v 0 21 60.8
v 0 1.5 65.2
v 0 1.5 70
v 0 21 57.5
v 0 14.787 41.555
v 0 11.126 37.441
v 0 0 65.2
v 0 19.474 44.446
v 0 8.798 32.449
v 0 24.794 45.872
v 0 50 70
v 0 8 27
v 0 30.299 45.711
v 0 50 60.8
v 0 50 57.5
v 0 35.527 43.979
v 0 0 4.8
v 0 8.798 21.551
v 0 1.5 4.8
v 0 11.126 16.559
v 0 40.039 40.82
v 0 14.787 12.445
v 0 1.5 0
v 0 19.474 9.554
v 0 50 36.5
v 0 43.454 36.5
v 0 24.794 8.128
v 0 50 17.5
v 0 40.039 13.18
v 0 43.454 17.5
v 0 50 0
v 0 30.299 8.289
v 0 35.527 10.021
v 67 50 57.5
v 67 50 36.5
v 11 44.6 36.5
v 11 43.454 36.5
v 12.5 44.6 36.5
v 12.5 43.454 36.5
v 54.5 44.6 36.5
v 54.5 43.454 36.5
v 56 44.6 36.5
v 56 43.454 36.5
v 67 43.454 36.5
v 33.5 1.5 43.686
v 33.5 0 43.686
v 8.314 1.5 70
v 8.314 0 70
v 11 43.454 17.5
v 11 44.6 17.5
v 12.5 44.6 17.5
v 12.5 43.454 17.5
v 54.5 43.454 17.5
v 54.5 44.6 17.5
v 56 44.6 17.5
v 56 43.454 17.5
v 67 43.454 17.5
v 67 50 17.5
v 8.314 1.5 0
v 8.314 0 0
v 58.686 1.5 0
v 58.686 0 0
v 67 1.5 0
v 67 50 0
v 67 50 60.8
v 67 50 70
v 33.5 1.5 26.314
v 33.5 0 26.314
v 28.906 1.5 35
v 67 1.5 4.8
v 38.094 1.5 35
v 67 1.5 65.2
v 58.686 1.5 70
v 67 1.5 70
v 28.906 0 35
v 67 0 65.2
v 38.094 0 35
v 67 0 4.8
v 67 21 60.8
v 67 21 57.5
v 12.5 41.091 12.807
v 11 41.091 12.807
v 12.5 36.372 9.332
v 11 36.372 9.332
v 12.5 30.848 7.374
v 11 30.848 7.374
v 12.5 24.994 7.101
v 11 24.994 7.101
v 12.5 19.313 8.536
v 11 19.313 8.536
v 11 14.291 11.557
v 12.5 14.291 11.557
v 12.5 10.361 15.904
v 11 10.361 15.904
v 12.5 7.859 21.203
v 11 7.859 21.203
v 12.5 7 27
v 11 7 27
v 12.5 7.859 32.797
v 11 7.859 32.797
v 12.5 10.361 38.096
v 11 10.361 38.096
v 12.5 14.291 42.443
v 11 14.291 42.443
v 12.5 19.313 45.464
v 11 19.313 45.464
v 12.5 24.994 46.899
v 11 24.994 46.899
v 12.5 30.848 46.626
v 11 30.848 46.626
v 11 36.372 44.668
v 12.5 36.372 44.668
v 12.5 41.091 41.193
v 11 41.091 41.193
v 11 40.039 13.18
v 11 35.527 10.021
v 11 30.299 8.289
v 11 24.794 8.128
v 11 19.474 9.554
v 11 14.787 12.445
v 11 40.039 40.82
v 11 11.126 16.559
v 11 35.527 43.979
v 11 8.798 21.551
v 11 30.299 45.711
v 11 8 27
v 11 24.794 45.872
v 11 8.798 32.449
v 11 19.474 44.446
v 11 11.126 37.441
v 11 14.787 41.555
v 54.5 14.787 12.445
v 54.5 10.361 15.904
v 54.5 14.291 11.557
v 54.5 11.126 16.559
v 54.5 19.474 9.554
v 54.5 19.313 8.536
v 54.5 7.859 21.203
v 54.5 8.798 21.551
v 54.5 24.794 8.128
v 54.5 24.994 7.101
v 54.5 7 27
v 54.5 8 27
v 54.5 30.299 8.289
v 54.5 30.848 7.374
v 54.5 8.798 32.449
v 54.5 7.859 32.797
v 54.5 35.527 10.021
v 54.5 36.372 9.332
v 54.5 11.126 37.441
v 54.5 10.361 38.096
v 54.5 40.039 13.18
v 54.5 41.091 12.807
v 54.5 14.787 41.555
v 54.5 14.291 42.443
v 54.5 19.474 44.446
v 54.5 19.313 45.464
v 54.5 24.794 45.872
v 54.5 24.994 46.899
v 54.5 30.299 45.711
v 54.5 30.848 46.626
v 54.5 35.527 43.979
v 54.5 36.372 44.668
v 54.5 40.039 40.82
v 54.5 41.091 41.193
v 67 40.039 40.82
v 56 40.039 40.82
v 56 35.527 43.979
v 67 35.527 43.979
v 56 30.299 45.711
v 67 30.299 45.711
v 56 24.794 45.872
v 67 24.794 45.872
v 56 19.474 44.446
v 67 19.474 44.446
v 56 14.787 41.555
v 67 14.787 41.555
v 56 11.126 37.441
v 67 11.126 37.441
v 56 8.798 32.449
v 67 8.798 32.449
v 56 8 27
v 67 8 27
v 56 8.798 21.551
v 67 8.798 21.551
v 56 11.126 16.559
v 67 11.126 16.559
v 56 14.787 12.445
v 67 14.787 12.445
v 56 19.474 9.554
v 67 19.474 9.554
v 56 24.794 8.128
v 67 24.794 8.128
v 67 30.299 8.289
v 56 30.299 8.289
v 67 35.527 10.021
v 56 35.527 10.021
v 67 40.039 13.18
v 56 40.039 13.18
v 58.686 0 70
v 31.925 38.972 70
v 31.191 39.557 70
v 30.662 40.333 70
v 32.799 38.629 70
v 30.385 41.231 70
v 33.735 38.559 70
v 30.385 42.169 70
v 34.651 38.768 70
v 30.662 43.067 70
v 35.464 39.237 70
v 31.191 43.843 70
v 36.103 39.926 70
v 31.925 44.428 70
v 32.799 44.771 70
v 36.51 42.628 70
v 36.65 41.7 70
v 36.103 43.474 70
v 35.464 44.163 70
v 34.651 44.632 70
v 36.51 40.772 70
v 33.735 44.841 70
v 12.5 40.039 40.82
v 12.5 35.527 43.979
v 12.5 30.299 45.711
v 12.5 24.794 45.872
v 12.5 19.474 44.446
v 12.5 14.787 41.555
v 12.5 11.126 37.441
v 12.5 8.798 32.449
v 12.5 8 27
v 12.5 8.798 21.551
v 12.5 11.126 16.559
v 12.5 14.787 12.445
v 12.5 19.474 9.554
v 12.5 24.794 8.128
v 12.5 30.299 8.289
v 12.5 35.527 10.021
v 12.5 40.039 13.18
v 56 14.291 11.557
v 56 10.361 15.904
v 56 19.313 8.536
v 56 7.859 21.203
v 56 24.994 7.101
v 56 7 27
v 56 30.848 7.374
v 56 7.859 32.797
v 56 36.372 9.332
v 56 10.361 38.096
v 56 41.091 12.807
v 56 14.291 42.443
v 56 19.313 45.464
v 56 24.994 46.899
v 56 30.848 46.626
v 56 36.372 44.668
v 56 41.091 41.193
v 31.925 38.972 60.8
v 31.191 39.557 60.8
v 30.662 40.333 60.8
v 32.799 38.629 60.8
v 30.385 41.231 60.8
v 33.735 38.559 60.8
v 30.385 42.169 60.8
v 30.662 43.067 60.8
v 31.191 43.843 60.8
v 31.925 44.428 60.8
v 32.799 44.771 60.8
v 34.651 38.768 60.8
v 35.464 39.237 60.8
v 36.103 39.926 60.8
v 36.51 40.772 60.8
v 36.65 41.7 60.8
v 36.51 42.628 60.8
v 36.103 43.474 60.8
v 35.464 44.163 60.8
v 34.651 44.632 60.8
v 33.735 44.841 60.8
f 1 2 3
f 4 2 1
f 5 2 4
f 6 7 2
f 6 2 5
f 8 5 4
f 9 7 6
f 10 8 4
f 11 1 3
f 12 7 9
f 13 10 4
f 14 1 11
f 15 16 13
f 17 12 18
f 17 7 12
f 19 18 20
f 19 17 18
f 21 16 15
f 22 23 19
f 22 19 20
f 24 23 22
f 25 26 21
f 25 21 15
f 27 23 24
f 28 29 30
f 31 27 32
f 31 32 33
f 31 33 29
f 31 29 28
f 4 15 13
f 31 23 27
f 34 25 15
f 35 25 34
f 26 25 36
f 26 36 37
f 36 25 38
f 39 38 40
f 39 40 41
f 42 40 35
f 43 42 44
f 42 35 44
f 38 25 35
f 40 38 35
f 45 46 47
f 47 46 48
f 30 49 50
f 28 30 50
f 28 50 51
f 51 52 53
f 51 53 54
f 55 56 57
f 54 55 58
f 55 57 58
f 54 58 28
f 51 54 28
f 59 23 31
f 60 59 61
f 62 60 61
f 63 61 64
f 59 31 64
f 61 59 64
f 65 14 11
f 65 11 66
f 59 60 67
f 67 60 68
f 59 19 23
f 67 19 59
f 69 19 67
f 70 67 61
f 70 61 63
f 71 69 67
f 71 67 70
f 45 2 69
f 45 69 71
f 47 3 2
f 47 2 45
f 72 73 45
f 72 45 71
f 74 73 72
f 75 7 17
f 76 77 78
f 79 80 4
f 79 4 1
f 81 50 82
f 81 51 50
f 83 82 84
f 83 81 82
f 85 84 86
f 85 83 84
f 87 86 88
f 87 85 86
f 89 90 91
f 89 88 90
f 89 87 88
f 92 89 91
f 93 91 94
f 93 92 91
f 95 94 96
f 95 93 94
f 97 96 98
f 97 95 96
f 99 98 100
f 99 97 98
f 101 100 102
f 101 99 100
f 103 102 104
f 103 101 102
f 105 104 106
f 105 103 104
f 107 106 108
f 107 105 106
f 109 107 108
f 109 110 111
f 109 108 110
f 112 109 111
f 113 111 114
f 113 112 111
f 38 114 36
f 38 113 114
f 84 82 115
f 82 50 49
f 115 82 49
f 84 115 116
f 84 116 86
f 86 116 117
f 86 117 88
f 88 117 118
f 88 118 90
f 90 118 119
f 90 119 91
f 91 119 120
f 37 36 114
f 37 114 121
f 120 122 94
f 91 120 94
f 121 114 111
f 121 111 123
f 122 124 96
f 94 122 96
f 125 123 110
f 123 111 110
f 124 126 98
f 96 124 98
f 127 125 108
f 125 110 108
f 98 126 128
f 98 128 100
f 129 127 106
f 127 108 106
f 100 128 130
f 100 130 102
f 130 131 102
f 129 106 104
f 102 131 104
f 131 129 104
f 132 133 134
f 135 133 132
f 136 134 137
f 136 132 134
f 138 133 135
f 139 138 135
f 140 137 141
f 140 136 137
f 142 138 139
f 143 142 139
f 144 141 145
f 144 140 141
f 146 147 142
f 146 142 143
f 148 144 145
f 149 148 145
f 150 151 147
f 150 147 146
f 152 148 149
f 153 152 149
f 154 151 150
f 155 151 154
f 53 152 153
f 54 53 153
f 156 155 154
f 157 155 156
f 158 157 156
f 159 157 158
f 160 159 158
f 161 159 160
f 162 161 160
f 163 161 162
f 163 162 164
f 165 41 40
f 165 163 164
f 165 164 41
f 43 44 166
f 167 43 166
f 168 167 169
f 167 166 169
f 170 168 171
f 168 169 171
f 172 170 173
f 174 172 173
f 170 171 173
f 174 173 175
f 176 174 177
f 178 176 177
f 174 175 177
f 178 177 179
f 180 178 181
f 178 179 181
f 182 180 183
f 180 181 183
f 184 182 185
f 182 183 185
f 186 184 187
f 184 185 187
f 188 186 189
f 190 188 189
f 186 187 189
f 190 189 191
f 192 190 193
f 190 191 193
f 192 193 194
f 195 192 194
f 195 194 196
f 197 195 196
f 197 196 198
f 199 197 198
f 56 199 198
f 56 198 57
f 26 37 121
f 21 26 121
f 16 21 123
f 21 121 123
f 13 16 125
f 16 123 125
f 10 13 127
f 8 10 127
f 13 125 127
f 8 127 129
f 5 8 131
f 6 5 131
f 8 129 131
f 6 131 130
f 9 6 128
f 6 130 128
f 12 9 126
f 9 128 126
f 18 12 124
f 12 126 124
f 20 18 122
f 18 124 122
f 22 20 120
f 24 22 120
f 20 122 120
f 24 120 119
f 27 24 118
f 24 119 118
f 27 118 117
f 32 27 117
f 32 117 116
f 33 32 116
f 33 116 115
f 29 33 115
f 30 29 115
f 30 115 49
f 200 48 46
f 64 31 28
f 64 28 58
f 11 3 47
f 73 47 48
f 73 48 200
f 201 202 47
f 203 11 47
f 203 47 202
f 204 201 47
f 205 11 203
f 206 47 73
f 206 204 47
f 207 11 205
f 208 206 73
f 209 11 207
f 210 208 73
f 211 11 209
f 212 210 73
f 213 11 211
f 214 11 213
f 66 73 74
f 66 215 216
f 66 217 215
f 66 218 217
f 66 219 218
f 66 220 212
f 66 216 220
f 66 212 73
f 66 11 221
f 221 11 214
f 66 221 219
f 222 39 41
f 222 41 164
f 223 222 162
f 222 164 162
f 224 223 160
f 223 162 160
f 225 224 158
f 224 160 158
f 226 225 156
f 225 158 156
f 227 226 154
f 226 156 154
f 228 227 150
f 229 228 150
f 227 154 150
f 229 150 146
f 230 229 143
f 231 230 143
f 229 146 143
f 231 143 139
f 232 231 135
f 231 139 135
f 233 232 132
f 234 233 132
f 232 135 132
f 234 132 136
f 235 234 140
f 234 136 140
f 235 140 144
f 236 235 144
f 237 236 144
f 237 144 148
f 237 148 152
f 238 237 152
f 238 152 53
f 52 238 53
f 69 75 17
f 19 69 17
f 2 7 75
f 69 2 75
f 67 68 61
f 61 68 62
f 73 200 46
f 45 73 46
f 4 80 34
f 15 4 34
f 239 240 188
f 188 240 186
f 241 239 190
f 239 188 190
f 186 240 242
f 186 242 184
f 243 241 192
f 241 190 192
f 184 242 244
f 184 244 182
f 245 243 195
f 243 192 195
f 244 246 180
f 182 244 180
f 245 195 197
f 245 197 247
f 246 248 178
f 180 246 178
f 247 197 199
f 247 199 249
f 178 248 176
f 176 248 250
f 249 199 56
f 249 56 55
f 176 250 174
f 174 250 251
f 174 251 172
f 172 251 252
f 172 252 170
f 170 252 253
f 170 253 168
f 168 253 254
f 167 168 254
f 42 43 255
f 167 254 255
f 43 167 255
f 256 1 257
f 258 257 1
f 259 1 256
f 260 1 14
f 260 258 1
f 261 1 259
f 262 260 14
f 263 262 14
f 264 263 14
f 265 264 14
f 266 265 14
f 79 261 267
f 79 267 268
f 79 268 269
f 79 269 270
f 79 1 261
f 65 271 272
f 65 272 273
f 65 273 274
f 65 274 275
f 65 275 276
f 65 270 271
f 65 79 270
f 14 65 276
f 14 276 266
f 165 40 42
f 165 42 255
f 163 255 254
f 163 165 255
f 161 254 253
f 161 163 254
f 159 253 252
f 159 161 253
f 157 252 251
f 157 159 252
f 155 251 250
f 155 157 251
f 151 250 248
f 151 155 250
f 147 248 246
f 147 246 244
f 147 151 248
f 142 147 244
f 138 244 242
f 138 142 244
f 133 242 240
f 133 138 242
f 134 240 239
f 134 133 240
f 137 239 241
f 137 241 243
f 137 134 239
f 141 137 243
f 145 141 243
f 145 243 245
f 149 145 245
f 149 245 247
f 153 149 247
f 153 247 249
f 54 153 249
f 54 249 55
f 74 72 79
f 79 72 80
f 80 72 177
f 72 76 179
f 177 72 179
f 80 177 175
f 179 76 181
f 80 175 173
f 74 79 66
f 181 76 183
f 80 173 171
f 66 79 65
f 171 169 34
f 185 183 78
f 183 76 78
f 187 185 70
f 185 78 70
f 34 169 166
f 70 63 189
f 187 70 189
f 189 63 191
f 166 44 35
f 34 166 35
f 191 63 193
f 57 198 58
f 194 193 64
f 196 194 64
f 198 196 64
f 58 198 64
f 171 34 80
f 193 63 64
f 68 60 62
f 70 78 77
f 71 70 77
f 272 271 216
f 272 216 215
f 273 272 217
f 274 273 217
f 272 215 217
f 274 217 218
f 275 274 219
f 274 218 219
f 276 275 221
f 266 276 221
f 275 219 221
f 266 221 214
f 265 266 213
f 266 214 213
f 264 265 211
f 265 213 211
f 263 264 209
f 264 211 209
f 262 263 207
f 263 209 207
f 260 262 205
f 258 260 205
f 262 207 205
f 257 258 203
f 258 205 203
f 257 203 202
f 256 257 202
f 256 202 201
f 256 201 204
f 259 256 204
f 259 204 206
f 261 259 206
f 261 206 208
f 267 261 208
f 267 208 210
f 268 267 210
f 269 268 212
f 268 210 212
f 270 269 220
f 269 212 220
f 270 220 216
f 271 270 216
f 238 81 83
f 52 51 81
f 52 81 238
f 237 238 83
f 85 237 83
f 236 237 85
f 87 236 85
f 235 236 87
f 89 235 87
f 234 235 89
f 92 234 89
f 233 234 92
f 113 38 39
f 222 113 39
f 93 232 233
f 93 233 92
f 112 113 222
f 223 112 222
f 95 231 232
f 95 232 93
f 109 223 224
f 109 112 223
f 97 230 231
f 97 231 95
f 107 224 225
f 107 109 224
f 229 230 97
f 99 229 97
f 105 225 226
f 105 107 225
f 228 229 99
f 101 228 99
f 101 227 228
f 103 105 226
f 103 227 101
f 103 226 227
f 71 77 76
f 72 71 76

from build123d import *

# Parameters (mm, degrees)
F0_W      = 67
F0_H      = 50
F1_DEPTH  = 70
F3_DEPTH  = 1.5
F4_W      = 29
F4_H      = 3.3
F5_DEPTH  = 67.001
F6_R      = 3.15
F7_DEPTH  = 9.2
F9_R      = 20
F10_DEPTH = 1.5
F12_R     = 20
F13_DEPTH = 1.5


with BuildPart() as f1:
    # F0 (on Top) → F1 (new body)
    with BuildSketch(Plane.XY):
        with Locations((33.5, 25)):
            Rectangle(F0_W, F0_H)
    extrude(amount=F1_DEPTH)

    # F2 (on face) → F3 (cut)
    with BuildSketch(Plane.XZ):
        Polygon((8.3138438763, 70), (0, 70), (0, 65.2), (28.9057142857, 35), (0, 4.8), (0, 0), (8.3138438763, 0), (33.5, 26.3138944576), (58.6861561237, 0), (67, 0), (67, 4.8), (38.0942857143, 35), (67, 65.2), (67, 70), (58.6861561237, 70), (33.5, 43.6861055424), align=None)
    extrude(amount=-F3_DEPTH, mode=Mode.SUBTRACT)

    # F4 (on face) → F5 (cut, through all)
    with BuildSketch(Plane.YZ.offset(67)):
        with BuildLine():
            Line((50, 36.5), (43.4544826719, 36.5))
            ThreePointArc((43.4544826719, 36.5), (8, 27), (43.4544826719, 17.5))
            Line((43.4544826719, 17.5), (50, 17.5))
            Line((50, 17.5), (50, 36.5))
        make_face()
        with Locations((35.5, 59.15)):
            Rectangle(F4_W, F4_H)
    extrude(amount=-F5_DEPTH, mode=Mode.SUBTRACT)

    # F6 (on face) → F7 (cut, through all)
    with BuildSketch(Plane.XY.offset(70)):
        with Locations((33.5, 41.7)):
            Circle(F6_R)
    extrude(amount=-F7_DEPTH, mode=Mode.SUBTRACT)

    # F9 (on offset) → F10 (cut)
    with BuildSketch(Plane.YZ.offset(54.5)):
        with Locations((27, 27)):
            Circle(F9_R)
    extrude(amount=F10_DEPTH, mode=Mode.SUBTRACT)

    # F12 (on offset) → F13 (cut)
    with BuildSketch(Plane(origin=(12.5, 0, 0), x_dir=(0, -1, 0), z_dir=(-1, 0, 0))):
        with Locations((-27, 27)):
            Circle(F12_R)
    extrude(amount=F13_DEPTH, mode=Mode.SUBTRACT)


solid = f1.part
